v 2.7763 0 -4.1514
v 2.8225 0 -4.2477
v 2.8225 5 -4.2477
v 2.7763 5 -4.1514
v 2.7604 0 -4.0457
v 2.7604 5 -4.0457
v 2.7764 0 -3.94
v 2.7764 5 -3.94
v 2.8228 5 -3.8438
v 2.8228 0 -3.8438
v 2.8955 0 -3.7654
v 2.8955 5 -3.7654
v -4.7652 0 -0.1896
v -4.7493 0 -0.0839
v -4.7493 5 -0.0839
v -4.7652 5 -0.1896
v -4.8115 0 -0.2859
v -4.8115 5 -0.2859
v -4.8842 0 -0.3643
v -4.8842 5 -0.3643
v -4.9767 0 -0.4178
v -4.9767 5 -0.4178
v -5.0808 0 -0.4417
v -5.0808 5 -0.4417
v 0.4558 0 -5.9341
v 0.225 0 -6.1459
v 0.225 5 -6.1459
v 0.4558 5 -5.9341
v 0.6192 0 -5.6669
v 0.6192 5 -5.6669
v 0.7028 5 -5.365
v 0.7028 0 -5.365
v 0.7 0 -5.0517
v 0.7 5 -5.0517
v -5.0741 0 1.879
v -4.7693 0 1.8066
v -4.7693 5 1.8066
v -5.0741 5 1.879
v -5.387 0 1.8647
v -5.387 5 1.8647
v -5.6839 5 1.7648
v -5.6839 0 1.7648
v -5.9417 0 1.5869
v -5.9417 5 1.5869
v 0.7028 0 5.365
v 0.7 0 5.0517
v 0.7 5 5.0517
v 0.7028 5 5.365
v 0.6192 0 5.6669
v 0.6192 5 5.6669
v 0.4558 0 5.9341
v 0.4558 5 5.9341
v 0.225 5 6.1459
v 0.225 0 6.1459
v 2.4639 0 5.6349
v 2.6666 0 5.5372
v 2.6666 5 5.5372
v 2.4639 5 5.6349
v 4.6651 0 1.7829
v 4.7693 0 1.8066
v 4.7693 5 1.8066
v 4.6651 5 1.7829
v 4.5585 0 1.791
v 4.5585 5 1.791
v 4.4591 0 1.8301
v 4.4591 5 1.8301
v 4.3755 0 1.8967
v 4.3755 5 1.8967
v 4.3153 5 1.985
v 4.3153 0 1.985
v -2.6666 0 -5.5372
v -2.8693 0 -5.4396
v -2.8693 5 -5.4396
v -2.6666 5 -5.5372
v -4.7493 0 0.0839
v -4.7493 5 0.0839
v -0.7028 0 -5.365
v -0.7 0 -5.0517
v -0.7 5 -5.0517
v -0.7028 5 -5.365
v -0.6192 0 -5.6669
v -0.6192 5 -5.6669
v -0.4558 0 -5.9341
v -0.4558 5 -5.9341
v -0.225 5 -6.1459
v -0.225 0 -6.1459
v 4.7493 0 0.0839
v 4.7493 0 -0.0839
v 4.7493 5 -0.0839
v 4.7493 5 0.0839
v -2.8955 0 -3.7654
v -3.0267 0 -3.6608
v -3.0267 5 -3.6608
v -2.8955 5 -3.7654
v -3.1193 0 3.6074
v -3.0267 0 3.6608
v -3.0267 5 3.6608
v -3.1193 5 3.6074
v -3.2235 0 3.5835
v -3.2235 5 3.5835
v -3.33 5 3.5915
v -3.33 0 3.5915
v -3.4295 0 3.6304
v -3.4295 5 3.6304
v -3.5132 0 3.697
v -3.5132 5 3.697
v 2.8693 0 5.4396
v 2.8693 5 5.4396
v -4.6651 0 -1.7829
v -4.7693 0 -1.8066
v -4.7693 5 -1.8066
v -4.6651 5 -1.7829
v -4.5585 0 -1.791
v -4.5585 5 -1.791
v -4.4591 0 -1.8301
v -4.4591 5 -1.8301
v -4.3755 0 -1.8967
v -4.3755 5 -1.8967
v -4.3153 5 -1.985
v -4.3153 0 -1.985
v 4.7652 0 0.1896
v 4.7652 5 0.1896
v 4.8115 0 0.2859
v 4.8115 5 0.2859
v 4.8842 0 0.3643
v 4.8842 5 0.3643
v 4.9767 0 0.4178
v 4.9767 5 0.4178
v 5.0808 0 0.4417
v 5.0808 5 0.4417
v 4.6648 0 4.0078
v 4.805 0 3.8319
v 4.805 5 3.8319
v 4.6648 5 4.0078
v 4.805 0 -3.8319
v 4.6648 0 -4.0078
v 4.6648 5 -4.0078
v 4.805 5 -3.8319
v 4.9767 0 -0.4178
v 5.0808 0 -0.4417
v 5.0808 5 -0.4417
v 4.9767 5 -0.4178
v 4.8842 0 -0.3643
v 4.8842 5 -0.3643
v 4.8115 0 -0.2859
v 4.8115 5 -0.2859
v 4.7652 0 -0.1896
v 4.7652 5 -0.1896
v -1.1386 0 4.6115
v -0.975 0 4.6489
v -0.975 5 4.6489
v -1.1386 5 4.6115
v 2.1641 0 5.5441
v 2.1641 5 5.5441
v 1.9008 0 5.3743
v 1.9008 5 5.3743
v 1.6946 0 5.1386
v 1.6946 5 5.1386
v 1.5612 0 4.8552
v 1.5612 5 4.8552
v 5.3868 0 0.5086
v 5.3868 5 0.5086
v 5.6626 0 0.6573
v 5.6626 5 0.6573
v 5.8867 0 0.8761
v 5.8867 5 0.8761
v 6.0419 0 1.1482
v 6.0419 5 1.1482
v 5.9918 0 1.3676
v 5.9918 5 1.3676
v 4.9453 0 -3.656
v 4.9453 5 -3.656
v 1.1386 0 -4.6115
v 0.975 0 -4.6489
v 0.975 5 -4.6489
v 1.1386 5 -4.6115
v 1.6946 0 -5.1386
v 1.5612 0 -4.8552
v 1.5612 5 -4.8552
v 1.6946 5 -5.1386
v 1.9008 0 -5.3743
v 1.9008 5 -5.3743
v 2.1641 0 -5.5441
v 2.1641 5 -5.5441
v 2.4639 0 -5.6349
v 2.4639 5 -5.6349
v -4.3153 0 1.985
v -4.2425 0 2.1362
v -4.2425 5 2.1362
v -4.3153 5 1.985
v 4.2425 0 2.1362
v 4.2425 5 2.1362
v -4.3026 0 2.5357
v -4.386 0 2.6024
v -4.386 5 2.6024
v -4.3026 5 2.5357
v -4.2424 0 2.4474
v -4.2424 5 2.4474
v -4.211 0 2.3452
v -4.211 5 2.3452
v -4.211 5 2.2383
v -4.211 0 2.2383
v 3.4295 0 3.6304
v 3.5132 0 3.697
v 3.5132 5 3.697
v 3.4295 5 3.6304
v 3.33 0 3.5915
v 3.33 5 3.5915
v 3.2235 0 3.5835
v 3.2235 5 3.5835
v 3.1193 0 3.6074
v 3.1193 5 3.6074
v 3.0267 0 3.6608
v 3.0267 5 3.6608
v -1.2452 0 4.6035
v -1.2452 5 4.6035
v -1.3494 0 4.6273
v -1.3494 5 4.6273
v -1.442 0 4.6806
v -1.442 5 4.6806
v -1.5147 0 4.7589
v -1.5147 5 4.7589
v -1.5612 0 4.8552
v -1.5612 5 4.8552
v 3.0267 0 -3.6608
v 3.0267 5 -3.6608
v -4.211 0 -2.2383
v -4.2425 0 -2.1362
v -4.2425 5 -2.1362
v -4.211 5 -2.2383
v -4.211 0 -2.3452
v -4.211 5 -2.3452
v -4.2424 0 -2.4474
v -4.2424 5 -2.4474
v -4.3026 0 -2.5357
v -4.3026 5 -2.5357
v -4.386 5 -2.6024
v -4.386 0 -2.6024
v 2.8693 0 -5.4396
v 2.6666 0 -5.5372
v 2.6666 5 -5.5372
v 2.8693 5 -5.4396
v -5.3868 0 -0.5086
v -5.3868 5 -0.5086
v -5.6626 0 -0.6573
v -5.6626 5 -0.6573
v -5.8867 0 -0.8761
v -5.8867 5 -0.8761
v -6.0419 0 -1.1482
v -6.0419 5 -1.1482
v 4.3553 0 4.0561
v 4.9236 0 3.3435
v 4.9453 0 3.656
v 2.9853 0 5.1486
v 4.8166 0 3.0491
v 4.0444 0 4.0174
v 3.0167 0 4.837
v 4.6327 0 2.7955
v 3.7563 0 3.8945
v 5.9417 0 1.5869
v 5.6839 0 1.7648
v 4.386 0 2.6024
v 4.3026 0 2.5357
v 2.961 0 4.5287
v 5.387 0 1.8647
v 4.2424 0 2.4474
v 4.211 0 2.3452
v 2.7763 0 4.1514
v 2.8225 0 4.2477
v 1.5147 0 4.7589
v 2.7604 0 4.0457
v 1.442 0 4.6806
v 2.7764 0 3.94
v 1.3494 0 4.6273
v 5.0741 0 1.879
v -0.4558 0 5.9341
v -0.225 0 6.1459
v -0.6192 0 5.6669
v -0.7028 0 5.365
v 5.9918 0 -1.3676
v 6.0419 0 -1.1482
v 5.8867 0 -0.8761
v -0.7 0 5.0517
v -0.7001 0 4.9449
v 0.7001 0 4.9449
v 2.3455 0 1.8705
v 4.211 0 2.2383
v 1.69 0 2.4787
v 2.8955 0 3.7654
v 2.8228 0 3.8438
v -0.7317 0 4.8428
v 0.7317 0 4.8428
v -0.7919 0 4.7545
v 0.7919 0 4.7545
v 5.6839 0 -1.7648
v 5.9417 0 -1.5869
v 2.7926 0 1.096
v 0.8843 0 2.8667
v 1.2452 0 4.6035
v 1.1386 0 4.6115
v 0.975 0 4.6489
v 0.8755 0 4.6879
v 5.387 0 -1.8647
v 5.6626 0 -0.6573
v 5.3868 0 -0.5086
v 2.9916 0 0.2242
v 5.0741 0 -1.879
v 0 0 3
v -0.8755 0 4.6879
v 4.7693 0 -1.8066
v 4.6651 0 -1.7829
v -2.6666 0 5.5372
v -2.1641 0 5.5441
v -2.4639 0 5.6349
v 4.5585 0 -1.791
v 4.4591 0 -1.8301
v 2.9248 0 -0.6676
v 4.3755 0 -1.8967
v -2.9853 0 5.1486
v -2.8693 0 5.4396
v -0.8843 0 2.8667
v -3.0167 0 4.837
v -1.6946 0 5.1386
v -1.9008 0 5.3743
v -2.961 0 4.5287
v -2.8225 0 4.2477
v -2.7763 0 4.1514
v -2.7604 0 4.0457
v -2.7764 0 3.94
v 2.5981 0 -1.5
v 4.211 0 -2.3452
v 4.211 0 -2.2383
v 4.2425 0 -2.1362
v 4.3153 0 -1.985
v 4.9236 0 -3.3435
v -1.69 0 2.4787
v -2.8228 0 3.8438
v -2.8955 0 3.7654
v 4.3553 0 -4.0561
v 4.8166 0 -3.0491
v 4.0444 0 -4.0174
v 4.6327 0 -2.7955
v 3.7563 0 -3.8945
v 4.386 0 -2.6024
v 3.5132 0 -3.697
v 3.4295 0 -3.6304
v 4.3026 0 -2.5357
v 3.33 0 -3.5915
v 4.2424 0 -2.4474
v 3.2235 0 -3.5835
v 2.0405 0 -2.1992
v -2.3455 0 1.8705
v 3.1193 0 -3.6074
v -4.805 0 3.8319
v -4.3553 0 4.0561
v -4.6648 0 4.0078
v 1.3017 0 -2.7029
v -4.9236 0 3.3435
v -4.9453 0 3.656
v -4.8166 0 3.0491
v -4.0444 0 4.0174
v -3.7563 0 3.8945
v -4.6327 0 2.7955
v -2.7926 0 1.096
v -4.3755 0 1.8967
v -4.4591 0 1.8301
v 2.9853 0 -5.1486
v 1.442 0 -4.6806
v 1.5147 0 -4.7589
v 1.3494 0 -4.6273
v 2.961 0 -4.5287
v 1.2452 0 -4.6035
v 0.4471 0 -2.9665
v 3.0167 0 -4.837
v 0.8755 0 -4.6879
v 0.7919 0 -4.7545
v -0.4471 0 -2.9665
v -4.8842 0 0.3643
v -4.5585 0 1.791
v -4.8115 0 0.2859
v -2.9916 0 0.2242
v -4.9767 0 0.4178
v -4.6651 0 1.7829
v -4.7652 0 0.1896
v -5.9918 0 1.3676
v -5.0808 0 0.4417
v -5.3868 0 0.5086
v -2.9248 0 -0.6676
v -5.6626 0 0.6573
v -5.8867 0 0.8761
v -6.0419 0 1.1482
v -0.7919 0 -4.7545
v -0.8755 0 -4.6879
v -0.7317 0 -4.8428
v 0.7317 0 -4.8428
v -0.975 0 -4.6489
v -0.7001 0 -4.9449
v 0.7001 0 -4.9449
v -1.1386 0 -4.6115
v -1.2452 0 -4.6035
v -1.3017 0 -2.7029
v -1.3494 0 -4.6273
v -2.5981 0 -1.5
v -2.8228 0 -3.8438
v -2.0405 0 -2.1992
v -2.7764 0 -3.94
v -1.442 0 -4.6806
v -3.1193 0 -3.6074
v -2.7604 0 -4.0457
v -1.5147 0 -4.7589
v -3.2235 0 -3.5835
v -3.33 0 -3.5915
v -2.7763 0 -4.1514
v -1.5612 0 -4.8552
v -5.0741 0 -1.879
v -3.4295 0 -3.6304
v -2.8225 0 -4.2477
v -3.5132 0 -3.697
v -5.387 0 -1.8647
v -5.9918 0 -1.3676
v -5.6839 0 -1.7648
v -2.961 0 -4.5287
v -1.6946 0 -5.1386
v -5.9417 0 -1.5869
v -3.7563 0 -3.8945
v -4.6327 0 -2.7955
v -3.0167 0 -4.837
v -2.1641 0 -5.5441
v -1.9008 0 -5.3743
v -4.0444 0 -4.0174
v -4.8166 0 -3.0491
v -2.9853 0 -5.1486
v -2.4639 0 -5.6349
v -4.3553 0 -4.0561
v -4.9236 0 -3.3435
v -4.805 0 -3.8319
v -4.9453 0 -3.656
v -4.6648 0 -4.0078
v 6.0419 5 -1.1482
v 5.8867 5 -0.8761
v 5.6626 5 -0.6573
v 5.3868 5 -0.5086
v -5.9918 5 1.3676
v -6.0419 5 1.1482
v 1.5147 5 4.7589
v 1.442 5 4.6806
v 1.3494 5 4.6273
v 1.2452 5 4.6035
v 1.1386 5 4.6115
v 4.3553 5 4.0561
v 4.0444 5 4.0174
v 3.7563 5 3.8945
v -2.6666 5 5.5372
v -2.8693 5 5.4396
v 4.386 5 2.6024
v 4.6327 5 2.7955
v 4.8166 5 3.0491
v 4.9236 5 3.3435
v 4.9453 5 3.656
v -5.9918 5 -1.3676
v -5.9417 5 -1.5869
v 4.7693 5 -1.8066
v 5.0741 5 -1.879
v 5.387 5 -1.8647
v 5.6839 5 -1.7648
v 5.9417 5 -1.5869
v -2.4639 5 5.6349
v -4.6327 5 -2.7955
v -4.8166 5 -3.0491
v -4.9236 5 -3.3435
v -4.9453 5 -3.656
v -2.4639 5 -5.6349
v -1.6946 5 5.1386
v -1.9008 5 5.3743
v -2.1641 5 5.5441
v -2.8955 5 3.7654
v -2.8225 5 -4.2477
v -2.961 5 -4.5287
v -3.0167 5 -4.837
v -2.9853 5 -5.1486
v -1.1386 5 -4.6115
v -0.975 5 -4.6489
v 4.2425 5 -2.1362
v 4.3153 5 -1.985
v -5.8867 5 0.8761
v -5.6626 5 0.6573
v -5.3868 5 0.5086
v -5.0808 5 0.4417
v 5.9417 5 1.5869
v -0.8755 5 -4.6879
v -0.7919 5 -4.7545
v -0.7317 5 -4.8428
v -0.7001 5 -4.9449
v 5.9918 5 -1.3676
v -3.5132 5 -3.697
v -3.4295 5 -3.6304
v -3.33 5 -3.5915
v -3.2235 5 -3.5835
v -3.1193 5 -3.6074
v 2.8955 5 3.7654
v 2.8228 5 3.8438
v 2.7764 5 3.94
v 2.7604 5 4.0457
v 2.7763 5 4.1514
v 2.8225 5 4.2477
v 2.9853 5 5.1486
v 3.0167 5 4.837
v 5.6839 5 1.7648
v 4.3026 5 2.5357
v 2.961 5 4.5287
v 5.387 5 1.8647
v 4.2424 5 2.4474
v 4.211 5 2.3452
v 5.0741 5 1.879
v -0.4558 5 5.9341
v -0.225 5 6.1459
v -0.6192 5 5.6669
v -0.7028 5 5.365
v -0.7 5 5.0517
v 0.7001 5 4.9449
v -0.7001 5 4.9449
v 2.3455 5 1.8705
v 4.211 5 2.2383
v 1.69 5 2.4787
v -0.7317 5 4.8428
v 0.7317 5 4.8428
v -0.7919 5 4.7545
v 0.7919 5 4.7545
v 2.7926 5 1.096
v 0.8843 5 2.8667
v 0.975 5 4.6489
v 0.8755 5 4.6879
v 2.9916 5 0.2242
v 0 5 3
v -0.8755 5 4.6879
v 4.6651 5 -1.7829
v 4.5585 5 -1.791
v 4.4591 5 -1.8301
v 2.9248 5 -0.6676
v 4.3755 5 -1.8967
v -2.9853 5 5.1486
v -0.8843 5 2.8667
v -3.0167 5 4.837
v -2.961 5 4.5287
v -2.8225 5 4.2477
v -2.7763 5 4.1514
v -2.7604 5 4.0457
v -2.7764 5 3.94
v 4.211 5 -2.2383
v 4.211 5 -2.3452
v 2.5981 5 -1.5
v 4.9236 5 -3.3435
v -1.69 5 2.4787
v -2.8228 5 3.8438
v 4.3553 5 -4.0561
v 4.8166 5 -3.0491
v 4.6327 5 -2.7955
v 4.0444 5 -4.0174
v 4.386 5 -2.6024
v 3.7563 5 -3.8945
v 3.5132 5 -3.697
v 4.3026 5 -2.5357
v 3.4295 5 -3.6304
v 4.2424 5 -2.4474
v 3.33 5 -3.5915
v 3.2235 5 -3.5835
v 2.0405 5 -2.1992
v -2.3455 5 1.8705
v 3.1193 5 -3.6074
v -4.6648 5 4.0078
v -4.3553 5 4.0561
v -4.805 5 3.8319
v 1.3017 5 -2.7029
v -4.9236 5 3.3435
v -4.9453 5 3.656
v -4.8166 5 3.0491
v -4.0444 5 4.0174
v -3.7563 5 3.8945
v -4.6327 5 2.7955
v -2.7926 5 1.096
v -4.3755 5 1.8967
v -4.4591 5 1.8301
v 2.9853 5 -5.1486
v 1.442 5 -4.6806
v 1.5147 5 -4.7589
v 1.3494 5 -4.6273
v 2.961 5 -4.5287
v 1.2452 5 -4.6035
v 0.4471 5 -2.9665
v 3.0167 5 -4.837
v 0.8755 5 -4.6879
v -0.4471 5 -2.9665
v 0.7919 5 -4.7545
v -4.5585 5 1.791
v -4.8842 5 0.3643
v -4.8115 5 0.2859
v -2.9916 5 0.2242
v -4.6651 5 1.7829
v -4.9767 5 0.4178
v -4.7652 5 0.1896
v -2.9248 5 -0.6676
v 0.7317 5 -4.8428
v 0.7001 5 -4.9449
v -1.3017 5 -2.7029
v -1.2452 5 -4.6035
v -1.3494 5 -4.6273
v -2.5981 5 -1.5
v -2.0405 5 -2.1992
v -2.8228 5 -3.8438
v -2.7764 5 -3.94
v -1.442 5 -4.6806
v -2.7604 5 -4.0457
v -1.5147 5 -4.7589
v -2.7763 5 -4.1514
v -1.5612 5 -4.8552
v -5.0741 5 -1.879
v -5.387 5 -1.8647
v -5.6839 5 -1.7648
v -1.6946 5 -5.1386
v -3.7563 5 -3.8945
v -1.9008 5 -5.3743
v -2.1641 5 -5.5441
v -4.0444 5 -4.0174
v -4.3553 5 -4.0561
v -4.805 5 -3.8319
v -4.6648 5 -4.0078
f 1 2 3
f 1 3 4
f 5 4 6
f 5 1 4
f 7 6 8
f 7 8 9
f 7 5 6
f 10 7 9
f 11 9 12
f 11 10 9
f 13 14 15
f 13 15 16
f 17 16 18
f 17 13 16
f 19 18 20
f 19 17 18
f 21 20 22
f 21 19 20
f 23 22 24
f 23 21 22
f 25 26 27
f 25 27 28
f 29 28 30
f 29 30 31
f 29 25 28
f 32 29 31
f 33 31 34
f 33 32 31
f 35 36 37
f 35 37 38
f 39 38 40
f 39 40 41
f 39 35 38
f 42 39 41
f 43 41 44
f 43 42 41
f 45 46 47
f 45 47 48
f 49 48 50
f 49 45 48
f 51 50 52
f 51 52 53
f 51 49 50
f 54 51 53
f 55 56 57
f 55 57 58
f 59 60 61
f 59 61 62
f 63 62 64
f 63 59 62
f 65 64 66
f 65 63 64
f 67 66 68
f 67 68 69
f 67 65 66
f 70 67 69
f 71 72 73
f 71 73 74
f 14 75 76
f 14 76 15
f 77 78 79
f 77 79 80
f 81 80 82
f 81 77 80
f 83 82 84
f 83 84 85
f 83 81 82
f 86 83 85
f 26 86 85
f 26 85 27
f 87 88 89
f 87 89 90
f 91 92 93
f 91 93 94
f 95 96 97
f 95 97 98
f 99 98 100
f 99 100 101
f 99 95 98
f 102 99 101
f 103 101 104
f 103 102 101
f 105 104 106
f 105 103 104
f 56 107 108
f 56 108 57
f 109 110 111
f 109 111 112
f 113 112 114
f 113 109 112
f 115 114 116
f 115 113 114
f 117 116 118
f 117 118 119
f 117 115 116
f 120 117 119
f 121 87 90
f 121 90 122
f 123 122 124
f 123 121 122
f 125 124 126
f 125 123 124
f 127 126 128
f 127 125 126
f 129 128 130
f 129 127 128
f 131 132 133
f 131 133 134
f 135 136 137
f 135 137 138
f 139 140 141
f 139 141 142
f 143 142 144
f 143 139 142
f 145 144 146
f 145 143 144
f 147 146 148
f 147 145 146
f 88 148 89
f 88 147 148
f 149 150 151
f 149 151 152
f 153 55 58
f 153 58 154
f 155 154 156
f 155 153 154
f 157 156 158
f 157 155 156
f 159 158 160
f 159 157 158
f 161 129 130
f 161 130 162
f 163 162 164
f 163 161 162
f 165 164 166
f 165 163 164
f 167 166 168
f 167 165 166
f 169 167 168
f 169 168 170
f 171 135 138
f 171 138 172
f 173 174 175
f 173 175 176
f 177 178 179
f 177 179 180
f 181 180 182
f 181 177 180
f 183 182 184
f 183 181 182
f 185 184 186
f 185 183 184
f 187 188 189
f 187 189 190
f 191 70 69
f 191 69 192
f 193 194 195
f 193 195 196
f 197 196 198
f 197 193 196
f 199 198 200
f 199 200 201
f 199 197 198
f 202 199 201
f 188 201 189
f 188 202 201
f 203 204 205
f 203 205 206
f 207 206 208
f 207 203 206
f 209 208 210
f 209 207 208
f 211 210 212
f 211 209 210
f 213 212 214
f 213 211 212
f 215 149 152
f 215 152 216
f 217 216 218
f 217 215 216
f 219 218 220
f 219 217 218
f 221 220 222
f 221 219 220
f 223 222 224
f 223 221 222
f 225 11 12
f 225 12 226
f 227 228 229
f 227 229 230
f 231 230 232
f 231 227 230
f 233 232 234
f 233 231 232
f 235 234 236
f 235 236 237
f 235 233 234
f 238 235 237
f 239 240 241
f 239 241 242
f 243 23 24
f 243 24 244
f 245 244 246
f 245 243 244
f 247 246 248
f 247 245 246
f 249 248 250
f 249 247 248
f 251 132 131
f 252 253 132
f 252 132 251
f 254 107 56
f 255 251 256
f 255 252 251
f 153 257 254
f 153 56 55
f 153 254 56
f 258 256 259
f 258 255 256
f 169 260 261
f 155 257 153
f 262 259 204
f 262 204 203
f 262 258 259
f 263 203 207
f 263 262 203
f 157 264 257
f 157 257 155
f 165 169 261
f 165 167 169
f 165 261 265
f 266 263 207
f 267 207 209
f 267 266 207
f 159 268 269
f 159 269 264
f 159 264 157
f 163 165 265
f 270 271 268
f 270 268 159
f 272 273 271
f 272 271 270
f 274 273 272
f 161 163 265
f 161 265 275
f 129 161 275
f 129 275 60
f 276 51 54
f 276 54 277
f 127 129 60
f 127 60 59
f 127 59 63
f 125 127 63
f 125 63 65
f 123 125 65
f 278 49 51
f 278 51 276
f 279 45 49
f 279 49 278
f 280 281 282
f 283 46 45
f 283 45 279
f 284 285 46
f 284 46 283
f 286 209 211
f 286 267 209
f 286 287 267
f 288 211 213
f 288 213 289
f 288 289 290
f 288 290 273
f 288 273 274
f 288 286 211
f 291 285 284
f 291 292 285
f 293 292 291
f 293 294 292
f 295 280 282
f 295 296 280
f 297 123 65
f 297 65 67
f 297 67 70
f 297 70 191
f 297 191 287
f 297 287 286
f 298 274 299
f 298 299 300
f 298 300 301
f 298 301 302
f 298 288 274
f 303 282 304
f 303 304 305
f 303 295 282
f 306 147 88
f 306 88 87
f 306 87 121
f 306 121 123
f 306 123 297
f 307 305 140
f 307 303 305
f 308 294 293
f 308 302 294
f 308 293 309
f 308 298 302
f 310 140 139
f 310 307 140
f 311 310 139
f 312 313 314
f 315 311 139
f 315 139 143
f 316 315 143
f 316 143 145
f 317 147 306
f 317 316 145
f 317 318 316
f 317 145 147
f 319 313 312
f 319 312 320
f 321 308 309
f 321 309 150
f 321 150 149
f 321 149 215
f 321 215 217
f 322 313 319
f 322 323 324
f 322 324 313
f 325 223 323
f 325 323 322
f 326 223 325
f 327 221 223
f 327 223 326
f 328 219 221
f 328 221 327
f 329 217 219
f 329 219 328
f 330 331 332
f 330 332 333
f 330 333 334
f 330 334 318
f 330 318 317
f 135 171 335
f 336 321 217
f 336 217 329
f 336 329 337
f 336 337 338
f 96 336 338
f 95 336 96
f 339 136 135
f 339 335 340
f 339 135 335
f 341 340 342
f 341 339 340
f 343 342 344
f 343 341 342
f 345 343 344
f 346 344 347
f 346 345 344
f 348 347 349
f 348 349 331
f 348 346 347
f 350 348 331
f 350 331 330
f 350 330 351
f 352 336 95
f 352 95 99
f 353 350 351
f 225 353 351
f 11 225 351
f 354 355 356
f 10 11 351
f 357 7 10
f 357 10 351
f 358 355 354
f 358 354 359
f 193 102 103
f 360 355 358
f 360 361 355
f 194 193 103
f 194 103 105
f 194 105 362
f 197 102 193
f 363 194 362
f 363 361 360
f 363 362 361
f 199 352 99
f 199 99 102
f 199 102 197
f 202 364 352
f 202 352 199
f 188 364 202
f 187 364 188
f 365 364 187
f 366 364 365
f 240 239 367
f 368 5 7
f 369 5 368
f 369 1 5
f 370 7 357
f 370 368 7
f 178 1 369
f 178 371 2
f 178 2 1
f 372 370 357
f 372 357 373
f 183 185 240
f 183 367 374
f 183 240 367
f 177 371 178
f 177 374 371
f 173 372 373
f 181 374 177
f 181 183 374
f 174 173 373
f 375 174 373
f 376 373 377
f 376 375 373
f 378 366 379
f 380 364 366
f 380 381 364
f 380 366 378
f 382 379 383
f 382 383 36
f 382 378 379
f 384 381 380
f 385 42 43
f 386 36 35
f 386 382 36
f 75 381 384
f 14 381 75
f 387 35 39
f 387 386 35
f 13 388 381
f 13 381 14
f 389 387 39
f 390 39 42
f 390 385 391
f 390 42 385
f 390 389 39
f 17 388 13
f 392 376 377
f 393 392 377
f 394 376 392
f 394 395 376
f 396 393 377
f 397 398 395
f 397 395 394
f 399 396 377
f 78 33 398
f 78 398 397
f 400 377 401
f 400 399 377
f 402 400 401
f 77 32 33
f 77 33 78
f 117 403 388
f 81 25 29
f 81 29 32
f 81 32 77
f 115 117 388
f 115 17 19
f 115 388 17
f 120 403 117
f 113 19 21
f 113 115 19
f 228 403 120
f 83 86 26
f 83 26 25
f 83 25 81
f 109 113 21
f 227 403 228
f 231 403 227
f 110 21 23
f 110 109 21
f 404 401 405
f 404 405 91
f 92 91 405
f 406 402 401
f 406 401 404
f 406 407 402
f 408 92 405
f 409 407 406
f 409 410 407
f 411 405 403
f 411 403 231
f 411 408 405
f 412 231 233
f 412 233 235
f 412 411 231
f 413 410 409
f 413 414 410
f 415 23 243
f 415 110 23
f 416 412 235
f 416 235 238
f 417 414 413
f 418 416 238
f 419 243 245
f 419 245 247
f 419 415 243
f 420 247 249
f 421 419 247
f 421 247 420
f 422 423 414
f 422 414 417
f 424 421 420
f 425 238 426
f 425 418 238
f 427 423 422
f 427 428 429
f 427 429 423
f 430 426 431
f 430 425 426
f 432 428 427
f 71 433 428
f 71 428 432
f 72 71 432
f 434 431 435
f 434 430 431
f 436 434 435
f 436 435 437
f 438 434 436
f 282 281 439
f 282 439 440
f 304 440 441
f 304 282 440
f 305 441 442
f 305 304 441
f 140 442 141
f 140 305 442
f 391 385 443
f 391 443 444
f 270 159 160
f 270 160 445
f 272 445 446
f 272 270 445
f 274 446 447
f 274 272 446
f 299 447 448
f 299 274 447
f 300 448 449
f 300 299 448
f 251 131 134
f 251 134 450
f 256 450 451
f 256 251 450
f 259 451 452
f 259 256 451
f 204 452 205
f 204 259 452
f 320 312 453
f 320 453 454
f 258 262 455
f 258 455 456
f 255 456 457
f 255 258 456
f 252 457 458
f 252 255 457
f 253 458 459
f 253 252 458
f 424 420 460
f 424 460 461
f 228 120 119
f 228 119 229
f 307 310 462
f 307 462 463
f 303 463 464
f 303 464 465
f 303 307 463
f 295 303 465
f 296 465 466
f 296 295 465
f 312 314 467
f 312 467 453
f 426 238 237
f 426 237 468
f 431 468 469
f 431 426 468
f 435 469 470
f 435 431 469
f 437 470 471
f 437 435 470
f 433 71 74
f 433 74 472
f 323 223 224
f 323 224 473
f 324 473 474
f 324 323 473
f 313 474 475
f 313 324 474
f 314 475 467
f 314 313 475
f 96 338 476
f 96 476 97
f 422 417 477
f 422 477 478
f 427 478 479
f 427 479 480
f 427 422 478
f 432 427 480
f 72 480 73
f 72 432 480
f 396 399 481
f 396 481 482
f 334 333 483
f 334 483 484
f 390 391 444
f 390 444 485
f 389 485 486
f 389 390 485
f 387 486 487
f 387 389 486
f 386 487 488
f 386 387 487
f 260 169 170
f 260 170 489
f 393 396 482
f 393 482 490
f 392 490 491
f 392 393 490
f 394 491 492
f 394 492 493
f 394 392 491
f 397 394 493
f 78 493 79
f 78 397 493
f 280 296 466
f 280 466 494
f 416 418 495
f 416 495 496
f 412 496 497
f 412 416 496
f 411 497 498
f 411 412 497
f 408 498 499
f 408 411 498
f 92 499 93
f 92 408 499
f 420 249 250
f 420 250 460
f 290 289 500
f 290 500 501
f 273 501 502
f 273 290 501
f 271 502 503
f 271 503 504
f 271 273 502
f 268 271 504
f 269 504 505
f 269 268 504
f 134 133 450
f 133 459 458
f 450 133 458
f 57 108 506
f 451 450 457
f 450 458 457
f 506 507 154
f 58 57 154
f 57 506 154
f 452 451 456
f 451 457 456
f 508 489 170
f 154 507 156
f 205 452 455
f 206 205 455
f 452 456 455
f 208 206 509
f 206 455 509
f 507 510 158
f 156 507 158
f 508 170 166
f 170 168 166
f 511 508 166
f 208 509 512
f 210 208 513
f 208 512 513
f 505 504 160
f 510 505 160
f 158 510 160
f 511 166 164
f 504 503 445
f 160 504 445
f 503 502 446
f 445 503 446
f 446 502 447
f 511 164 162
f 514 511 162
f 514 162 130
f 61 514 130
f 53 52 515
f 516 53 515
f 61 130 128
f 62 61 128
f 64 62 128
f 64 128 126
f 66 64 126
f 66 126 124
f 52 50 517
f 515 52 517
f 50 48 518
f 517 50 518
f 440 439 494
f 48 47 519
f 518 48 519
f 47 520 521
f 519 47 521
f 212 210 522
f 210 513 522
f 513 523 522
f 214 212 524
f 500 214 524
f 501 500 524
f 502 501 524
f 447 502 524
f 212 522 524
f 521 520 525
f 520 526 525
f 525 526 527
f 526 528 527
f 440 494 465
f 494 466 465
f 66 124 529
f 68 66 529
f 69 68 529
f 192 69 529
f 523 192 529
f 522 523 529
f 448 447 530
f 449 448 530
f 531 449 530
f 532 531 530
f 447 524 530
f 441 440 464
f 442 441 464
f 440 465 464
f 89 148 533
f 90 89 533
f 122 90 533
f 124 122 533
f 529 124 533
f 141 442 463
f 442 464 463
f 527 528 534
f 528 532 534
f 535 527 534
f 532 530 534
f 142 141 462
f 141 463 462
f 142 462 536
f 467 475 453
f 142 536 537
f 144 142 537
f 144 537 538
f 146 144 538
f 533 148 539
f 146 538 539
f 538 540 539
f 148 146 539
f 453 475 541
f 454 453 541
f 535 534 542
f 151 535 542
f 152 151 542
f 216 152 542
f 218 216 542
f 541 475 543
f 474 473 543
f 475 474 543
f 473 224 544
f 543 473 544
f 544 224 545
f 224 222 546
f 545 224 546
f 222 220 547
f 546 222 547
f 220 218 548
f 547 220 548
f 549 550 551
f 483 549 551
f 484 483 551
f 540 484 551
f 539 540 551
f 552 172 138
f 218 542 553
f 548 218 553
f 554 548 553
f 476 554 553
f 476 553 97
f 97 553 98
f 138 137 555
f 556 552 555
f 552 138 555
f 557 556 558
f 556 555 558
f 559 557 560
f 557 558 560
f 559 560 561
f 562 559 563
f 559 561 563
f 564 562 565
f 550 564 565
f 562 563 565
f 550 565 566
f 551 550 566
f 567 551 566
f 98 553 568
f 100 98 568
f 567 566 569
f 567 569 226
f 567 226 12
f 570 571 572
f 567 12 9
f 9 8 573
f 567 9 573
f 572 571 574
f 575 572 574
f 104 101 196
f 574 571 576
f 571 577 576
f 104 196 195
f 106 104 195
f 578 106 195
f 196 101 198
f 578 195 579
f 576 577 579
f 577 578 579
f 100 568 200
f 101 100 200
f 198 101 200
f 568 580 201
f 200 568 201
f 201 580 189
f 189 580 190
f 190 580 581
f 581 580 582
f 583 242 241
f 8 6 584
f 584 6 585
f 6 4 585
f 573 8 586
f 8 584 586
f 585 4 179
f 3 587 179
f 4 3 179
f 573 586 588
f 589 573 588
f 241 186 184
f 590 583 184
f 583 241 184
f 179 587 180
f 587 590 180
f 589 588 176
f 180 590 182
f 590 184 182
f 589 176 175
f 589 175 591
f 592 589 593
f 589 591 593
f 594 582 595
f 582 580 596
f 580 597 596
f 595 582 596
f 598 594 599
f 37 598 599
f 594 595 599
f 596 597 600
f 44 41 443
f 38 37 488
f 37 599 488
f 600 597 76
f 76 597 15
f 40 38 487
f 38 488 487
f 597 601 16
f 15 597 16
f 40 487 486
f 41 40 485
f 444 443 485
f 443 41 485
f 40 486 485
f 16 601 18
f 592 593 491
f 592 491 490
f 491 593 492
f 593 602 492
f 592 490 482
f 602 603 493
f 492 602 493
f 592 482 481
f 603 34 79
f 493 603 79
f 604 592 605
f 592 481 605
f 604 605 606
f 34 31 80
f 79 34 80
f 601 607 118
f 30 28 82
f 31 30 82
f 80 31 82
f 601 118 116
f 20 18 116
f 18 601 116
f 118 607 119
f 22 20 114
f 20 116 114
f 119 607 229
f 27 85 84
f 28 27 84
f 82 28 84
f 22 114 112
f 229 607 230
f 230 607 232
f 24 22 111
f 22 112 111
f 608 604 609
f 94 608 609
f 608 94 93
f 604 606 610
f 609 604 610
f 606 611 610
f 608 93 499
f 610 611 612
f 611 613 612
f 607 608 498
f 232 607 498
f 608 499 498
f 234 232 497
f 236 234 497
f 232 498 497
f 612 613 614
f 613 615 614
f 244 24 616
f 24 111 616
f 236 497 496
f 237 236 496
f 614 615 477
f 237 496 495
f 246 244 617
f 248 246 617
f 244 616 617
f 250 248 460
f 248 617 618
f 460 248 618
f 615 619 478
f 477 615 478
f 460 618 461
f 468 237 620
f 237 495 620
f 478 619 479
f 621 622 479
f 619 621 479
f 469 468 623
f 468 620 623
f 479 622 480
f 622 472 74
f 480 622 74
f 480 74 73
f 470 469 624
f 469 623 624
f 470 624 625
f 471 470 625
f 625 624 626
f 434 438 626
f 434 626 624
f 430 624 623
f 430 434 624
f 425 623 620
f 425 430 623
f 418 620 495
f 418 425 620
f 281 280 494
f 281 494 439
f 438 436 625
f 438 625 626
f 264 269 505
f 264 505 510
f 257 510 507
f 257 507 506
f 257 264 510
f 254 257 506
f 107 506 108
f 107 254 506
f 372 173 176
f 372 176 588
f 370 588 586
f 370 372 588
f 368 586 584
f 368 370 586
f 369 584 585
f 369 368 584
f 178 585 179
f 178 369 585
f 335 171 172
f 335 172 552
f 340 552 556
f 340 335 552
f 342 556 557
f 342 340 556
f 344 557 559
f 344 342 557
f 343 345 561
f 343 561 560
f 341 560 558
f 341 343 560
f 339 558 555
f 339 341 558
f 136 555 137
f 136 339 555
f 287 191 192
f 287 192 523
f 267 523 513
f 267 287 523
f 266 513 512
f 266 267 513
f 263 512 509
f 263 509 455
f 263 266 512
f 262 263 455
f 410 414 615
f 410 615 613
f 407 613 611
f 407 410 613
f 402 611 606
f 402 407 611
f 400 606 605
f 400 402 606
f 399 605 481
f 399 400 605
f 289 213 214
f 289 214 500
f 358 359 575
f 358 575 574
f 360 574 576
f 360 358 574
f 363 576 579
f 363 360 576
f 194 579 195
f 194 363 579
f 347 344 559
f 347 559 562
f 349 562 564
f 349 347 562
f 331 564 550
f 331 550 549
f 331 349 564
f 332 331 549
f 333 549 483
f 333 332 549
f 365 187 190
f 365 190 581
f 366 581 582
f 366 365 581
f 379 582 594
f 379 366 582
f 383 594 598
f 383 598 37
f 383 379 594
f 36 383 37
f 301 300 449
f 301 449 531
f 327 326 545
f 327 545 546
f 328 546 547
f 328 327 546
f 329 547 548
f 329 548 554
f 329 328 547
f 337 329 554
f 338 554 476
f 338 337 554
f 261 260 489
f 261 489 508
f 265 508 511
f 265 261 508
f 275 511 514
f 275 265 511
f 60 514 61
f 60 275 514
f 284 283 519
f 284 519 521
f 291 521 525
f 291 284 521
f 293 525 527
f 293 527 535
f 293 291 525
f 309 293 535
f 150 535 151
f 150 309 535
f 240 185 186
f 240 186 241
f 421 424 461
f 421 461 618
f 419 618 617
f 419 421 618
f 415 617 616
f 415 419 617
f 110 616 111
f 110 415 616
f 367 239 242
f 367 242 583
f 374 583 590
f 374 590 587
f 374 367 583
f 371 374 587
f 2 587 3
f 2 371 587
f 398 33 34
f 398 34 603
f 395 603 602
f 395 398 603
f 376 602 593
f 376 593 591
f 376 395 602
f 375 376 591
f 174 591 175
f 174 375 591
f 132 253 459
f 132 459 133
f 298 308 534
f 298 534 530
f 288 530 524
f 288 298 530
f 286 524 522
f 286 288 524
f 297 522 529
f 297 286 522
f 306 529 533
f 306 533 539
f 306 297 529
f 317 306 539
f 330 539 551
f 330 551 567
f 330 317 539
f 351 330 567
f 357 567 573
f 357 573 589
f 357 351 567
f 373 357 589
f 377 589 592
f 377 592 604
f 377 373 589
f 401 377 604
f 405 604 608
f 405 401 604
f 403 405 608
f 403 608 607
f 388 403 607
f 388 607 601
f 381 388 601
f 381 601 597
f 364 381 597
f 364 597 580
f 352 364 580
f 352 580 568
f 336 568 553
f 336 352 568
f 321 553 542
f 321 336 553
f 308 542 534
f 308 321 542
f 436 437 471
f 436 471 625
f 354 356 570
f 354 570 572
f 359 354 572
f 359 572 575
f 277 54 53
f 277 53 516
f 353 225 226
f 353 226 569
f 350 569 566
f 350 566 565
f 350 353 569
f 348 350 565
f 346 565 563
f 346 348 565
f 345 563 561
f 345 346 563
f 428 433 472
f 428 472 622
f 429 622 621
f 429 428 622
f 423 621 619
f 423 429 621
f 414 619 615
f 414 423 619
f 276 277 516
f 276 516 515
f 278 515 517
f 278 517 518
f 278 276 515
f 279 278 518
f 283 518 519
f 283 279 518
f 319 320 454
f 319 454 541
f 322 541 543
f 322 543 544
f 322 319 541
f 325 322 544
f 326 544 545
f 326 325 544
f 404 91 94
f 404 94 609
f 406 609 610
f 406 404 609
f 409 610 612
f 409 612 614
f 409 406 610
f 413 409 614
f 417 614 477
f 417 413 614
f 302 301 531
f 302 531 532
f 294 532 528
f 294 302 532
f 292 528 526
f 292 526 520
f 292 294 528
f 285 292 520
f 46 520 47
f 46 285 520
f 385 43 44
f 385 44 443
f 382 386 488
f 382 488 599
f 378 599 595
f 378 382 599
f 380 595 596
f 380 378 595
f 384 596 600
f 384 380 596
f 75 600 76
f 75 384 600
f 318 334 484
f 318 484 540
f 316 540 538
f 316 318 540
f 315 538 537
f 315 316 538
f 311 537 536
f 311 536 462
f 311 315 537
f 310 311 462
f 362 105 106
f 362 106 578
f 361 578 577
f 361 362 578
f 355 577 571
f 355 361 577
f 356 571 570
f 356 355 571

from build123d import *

# Parameters (mm, degrees)
SKETCH1_R           = 3
BOSS_EXTRUDE1_DEPTH = 5


with BuildPart() as part:
    # Sketch1 → Boss-Extrude1 (new body)
    with BuildSketch(Plane(origin=(0, 0, 0), x_dir=(1, 0, 0), z_dir=(0, 1, 0))):
        with BuildLine():
            Line((-0.225, 6.145882768), (0, 6.145882768))
            Line((0, 6.145882768), (0.225, 6.145882768))
            ThreePointArc((0.225, 6.145882768), (0.619244207, 5.666854432), (0.7, 5.051732376))
            ThreePointArc((0.7, 5.051732376), (0.758505487, 4.796373711), (0.975, 4.648857386))
            Line((0.975, 4.648857386), (1.138618979, 4.611512422))
            ThreePointArc((1.138618979, 4.611512422), (1.39767873, 4.650486589), (1.561186325, 4.855172217))
            ThreePointArc((1.561186325, 4.855172217), (1.900836238, 5.374339414), (2.4638806, 5.634872881))
            Line((2.4638806, 5.634872881), (2.666598596, 5.53724904))
            Line((2.666598596, 5.53724904), (2.869316591, 5.439625199))
            ThreePointArc((2.869316591, 5.439625199), (3.016675742, 4.83697943), (2.82254274, 4.247734982))
            ThreePointArc((2.82254274, 4.247734982), (2.76445839, 3.992280195), (2.895508272, 3.765439131))
            Line((2.895508272, 3.765439131), (3.026720505, 3.660800866))
            ThreePointArc((3.026720505, 3.660800866), (3.277035533, 3.583513564), (3.513160551, 3.696985656))
            ThreePointArc((3.513160551, 3.696985656), (4.044432754, 4.017370563), (4.66475943, 4.007807313))
            Line((4.66475943, 4.007807313), (4.805044636, 3.831895229))
            Line((4.805044636, 3.831895229), (4.945329841, 3.655983146))
            ThreePointArc((4.945329841, 3.655983146), (4.816617649, 3.049081331), (4.386046274, 2.602421581))
            ThreePointArc((4.386046274, 2.602421581), (4.222876405, 2.397466625), (4.242525619, 2.136229475))
            Line((4.242525619, 2.136229475), (4.315342915, 1.985022802))
            ThreePointArc((4.315342915, 1.985022802), (4.507335258, 1.806781729), (4.769310245, 1.806565745))
            ThreePointArc((4.769310245, 1.806565745), (5.386979761, 1.864712202), (5.941725446, 1.586946354))
            Line((5.941725446, 1.586946354), (5.991792656, 1.367587574))
            Line((5.991792656, 1.367587574), (6.041859866, 1.148228793))
            ThreePointArc((6.041859866, 1.148228793), (5.662569359, 0.657275279), (5.080839552, 0.441666668))
            ThreePointArc((5.080839552, 0.441666668), (4.844901957, 0.327805387), (4.749258736, 0.083913373))
            Line((4.749258736, 0.083913373), (4.749258736, -0.083913373))
            ThreePointArc((4.749258736, -0.083913373), (4.844901957, -0.327805387), (5.080839552, -0.441666668))
            ThreePointArc((5.080839552, -0.441666668), (5.662569359, -0.657275279), (6.041859866, -1.148228793))
            Line((6.041859866, -1.148228793), (5.991792656, -1.367587574))
            Line((5.991792656, -1.367587574), (5.941725446, -1.586946354))
            ThreePointArc((5.941725446, -1.586946354), (5.386979761, -1.864712202), (4.769310245, -1.806565745))
            ThreePointArc((4.769310245, -1.806565745), (4.507335258, -1.806781729), (4.315342915, -1.985022802))
            Line((4.315342915, -1.985022802), (4.242525619, -2.136229475))
            ThreePointArc((4.242525619, -2.136229475), (4.222876405, -2.397466625), (4.386046274, -2.602421581))
            ThreePointArc((4.386046274, -2.602421581), (4.816617649, -3.049081331), (4.945329841, -3.655983146))
            Line((4.945329841, -3.655983146), (4.805044636, -3.831895229))
            Line((4.805044636, -3.831895229), (4.66475943, -4.007807313))
            ThreePointArc((4.66475943, -4.007807313), (4.044432754, -4.017370563), (3.513160551, -3.696985656))
            ThreePointArc((3.513160551, -3.696985656), (3.277035533, -3.583513564), (3.026720505, -3.660800866))
            Line((3.026720505, -3.660800866), (2.895508272, -3.765439131))
            ThreePointArc((2.895508272, -3.765439131), (2.76445839, -3.992280195), (2.82254274, -4.247734982))
            ThreePointArc((2.82254274, -4.247734982), (3.016675742, -4.83697943), (2.869316591, -5.439625199))
            Line((2.869316591, -5.439625199), (2.666598596, -5.53724904))
            Line((2.666598596, -5.53724904), (2.4638806, -5.634872881))
            ThreePointArc((2.4638806, -5.634872881), (1.900836238, -5.374339414), (1.561186325, -4.855172217))
            ThreePointArc((1.561186325, -4.855172217), (1.39767873, -4.650486589), (1.138618979, -4.611512422))
            Line((1.138618979, -4.611512422), (0.975, -4.648857386))
            ThreePointArc((0.975, -4.648857386), (0.758505487, -4.796373711), (0.7, -5.051732376))
            ThreePointArc((0.7, -5.051732376), (0.619244207, -5.666854432), (0.225, -6.145882768))
            Line((0.225, -6.145882768), (0, -6.145882768))
            Line((0, -6.145882768), (-0.225, -6.145882768))
            ThreePointArc((-0.225, -6.145882768), (-0.619244207, -5.666854432), (-0.7, -5.051732376))
            ThreePointArc((-0.7, -5.051732376), (-0.758505487, -4.796373711), (-0.975, -4.648857386))
            Line((-0.975, -4.648857386), (-1.138618979, -4.611512422))
            ThreePointArc((-1.138618979, -4.611512422), (-1.39767873, -4.650486589), (-1.561186325, -4.855172217))
            ThreePointArc((-1.561186325, -4.855172217), (-1.900836238, -5.374339414), (-2.4638806, -5.634872881))
            Line((-2.4638806, -5.634872881), (-2.666598596, -5.53724904))
            Line((-2.666598596, -5.53724904), (-2.869316591, -5.439625199))
            ThreePointArc((-2.869316591, -5.439625199), (-3.016675742, -4.83697943), (-2.82254274, -4.247734982))
            ThreePointArc((-2.82254274, -4.247734982), (-2.76445839, -3.992280195), (-2.895508272, -3.765439131))
            Line((-2.895508272, -3.765439131), (-3.026720505, -3.660800866))
            ThreePointArc((-3.026720505, -3.660800866), (-3.277035533, -3.583513564), (-3.513160551, -3.696985656))
            ThreePointArc((-3.513160551, -3.696985656), (-4.044432754, -4.017370563), (-4.66475943, -4.007807313))
            Line((-4.66475943, -4.007807313), (-4.805044636, -3.831895229))
            Line((-4.805044636, -3.831895229), (-4.945329841, -3.655983146))
            ThreePointArc((-4.945329841, -3.655983146), (-4.816617649, -3.049081331), (-4.386046274, -2.602421581))
            ThreePointArc((-4.386046274, -2.602421581), (-4.222876405, -2.397466625), (-4.242525619, -2.136229475))
            Line((-4.242525619, -2.136229475), (-4.315342915, -1.985022802))
            ThreePointArc((-4.315342915, -1.985022802), (-4.507335258, -1.806781729), (-4.769310245, -1.806565745))
            ThreePointArc((-4.769310245, -1.806565745), (-5.386979761, -1.864712202), (-5.941725446, -1.586946354))
            Line((-5.941725446, -1.586946354), (-5.991792656, -1.367587574))
            Line((-5.991792656, -1.367587574), (-6.041859866, -1.148228793))
            ThreePointArc((-6.041859866, -1.148228793), (-5.662569359, -0.657275279), (-5.080839552, -0.441666668))
            ThreePointArc((-5.080839552, -0.441666668), (-4.844901957, -0.327805387), (-4.749258736, -0.083913373))
            Line((-4.749258736, -0.083913373), (-4.749258736, 0.083913373))
            ThreePointArc((-4.749258736, 0.083913373), (-4.844901957, 0.327805387), (-5.080839552, 0.441666668))
            ThreePointArc((-5.080839552, 0.441666668), (-5.662569359, 0.657275279), (-6.041859866, 1.148228793))
            Line((-6.041859866, 1.148228793), (-5.991792656, 1.367587574))
            Line((-5.991792656, 1.367587574), (-5.941725446, 1.586946354))
            ThreePointArc((-5.941725446, 1.586946354), (-5.386979761, 1.864712202), (-4.769310245, 1.806565745))
            ThreePointArc((-4.769310245, 1.806565745), (-4.507335258, 1.806781729), (-4.315342915, 1.985022802))
            Line((-4.315342915, 1.985022802), (-4.242525619, 2.136229475))
            ThreePointArc((-4.242525619, 2.136229475), (-4.222876405, 2.397466625), (-4.386046274, 2.602421581))
            ThreePointArc((-4.386046274, 2.602421581), (-4.816617649, 3.049081331), (-4.945329841, 3.655983146))
            Line((-4.945329841, 3.655983146), (-4.805044636, 3.831895229))
            Line((-4.805044636, 3.831895229), (-4.66475943, 4.007807313))
            ThreePointArc((-4.66475943, 4.007807313), (-4.044432754, 4.017370563), (-3.513160551, 3.696985656))
            ThreePointArc((-3.513160551, 3.696985656), (-3.277035533, 3.583513564), (-3.026720505, 3.660800866))
            Line((-3.026720505, 3.660800866), (-2.895508272, 3.765439131))
            ThreePointArc((-2.895508272, 3.765439131), (-2.76445839, 3.992280195), (-2.82254274, 4.247734982))
            ThreePointArc((-2.82254274, 4.247734982), (-3.016675742, 4.83697943), (-2.869316591, 5.439625199))
            Line((-2.869316591, 5.439625199), (-2.666598596, 5.53724904))
            Line((-2.666598596, 5.53724904), (-2.4638806, 5.634872881))
            ThreePointArc((-2.4638806, 5.634872881), (-1.900836238, 5.374339414), (-1.561186325, 4.855172217))
            ThreePointArc((-1.561186325, 4.855172217), (-1.39767873, 4.650486589), (-1.138618979, 4.611512422))
            Line((-1.138618979, 4.611512422), (-0.975, 4.648857386))
            ThreePointArc((-0.975, 4.648857386), (-0.758505487, 4.796373711), (-0.7, 5.051732376))
            ThreePointArc((-0.7, 5.051732376), (-0.619244207, 5.666854432), (-0.225, 6.145882768))
        make_face()
        with Locations(Location((0, 0, 0), (0, 0, 270))):
            Circle(SKETCH1_R, mode=Mode.SUBTRACT)
    extrude(amount=BOSS_EXTRUDE1_DEPTH)


solid = part.part
